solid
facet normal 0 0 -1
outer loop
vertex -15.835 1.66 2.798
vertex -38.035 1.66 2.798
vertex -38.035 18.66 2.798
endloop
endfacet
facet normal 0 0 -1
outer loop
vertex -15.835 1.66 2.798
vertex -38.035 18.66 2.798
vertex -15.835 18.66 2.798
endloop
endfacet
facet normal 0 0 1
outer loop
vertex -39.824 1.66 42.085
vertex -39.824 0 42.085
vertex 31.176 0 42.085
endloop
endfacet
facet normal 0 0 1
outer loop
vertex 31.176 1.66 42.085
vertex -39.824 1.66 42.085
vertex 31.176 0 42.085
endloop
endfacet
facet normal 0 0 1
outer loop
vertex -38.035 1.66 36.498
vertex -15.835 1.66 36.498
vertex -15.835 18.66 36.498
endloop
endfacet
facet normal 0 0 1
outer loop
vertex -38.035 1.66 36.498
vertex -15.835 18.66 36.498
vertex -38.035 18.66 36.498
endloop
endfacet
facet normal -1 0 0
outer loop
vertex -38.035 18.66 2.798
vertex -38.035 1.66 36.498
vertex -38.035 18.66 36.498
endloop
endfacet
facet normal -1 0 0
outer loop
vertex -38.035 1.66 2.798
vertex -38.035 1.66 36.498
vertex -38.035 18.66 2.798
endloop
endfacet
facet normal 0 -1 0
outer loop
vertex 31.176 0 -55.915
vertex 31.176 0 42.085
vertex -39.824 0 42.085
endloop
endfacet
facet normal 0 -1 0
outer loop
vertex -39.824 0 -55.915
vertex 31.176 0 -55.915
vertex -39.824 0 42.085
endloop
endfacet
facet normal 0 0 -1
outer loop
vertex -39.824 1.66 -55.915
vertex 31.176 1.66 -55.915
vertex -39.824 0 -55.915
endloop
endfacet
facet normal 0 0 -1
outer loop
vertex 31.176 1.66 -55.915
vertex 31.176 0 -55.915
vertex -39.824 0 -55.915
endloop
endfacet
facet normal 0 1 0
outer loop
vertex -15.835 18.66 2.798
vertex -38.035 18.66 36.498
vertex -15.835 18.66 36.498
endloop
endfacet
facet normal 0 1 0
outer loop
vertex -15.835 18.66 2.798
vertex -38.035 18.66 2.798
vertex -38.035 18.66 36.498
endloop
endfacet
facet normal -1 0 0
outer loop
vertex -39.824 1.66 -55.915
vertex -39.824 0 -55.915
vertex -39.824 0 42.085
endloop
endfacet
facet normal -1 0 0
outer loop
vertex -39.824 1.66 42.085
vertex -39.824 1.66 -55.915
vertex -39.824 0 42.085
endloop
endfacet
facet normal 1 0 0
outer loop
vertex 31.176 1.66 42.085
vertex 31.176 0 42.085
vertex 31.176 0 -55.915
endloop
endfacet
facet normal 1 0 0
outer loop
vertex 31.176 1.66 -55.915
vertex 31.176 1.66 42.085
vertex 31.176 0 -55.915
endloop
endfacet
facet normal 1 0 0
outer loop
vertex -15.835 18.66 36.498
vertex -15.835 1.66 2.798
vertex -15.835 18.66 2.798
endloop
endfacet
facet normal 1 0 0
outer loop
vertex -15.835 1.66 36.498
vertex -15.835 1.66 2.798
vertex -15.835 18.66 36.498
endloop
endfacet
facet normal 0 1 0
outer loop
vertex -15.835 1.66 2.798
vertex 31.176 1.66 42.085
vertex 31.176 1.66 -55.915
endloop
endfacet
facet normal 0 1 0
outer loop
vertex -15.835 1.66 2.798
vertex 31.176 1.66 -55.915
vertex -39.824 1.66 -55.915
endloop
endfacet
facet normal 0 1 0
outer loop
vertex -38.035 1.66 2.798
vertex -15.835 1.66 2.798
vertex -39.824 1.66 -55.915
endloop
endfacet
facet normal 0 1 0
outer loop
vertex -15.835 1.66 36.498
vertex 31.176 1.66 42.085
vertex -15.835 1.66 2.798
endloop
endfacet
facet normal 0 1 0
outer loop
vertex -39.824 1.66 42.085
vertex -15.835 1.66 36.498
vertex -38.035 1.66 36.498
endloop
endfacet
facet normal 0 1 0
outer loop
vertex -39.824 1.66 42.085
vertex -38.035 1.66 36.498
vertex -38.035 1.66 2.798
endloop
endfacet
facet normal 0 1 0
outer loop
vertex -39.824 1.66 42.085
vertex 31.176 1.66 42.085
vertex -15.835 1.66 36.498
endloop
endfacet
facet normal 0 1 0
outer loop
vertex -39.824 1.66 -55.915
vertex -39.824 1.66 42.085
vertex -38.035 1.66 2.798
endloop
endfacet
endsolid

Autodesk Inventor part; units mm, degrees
ref_plane "YZ Plane" through (0, 0, 0) normal (1, 0, 0) x (0, 1, 0)
ref_plane "XZ Plane" through (0, 0, 0) normal (0, 1, 0) x (-1, 0, 0)
ref_plane "XY Plane" through (0, 0, 0) normal (0, 0, 1) x (1, 0, 0)
sketch "Sketch1" plane through (0, 0, 0) normal (0, 1, 0) x (-1, 0, 0)
  line L0 (39.8244, 42.085) -> (-31.1756, 42.085)
  line L1 (-31.1756, 42.085) -> (-31.1756, -55.915)
  line L2 (-31.1756, -55.915) -> (39.8244, -55.915)
  line L3 (39.8244, -55.915) -> (39.8244, 42.085)
  point P0 (0, 0)
  dimension "d0" = 71
  dimension "d1" = 98
extrude "Extrusion1" add sketch "Sketch1" along normal blind 1.66
sketch "Sketch2" plane through (0, 1.66, 0) normal (0, 1, 0) x (1, 0, 0)
  line L0 (-38.0351, -2.7975) -> (-15.8351, -2.7975)
  line L1 (-15.8351, -2.7975) -> (-15.8351, -36.4975)
  line L2 (-15.8351, -36.4975) -> (-38.0351, -36.4975)
  line L3 (-38.0351, -36.4975) -> (-38.0351, -2.7975)
  point P0 (0, 0)
  dimension "d4" = 33.7
  dimension "d5" = 22.2
extrude "Extrusion2" add sketch "Sketch2" along normal blind 17
sketch "Sketch3" plane through (0, 1.66, 0) normal (0, 1, 0) x (1, 0, 0)
  point P0 (0, 0)
properties part number "Board"
